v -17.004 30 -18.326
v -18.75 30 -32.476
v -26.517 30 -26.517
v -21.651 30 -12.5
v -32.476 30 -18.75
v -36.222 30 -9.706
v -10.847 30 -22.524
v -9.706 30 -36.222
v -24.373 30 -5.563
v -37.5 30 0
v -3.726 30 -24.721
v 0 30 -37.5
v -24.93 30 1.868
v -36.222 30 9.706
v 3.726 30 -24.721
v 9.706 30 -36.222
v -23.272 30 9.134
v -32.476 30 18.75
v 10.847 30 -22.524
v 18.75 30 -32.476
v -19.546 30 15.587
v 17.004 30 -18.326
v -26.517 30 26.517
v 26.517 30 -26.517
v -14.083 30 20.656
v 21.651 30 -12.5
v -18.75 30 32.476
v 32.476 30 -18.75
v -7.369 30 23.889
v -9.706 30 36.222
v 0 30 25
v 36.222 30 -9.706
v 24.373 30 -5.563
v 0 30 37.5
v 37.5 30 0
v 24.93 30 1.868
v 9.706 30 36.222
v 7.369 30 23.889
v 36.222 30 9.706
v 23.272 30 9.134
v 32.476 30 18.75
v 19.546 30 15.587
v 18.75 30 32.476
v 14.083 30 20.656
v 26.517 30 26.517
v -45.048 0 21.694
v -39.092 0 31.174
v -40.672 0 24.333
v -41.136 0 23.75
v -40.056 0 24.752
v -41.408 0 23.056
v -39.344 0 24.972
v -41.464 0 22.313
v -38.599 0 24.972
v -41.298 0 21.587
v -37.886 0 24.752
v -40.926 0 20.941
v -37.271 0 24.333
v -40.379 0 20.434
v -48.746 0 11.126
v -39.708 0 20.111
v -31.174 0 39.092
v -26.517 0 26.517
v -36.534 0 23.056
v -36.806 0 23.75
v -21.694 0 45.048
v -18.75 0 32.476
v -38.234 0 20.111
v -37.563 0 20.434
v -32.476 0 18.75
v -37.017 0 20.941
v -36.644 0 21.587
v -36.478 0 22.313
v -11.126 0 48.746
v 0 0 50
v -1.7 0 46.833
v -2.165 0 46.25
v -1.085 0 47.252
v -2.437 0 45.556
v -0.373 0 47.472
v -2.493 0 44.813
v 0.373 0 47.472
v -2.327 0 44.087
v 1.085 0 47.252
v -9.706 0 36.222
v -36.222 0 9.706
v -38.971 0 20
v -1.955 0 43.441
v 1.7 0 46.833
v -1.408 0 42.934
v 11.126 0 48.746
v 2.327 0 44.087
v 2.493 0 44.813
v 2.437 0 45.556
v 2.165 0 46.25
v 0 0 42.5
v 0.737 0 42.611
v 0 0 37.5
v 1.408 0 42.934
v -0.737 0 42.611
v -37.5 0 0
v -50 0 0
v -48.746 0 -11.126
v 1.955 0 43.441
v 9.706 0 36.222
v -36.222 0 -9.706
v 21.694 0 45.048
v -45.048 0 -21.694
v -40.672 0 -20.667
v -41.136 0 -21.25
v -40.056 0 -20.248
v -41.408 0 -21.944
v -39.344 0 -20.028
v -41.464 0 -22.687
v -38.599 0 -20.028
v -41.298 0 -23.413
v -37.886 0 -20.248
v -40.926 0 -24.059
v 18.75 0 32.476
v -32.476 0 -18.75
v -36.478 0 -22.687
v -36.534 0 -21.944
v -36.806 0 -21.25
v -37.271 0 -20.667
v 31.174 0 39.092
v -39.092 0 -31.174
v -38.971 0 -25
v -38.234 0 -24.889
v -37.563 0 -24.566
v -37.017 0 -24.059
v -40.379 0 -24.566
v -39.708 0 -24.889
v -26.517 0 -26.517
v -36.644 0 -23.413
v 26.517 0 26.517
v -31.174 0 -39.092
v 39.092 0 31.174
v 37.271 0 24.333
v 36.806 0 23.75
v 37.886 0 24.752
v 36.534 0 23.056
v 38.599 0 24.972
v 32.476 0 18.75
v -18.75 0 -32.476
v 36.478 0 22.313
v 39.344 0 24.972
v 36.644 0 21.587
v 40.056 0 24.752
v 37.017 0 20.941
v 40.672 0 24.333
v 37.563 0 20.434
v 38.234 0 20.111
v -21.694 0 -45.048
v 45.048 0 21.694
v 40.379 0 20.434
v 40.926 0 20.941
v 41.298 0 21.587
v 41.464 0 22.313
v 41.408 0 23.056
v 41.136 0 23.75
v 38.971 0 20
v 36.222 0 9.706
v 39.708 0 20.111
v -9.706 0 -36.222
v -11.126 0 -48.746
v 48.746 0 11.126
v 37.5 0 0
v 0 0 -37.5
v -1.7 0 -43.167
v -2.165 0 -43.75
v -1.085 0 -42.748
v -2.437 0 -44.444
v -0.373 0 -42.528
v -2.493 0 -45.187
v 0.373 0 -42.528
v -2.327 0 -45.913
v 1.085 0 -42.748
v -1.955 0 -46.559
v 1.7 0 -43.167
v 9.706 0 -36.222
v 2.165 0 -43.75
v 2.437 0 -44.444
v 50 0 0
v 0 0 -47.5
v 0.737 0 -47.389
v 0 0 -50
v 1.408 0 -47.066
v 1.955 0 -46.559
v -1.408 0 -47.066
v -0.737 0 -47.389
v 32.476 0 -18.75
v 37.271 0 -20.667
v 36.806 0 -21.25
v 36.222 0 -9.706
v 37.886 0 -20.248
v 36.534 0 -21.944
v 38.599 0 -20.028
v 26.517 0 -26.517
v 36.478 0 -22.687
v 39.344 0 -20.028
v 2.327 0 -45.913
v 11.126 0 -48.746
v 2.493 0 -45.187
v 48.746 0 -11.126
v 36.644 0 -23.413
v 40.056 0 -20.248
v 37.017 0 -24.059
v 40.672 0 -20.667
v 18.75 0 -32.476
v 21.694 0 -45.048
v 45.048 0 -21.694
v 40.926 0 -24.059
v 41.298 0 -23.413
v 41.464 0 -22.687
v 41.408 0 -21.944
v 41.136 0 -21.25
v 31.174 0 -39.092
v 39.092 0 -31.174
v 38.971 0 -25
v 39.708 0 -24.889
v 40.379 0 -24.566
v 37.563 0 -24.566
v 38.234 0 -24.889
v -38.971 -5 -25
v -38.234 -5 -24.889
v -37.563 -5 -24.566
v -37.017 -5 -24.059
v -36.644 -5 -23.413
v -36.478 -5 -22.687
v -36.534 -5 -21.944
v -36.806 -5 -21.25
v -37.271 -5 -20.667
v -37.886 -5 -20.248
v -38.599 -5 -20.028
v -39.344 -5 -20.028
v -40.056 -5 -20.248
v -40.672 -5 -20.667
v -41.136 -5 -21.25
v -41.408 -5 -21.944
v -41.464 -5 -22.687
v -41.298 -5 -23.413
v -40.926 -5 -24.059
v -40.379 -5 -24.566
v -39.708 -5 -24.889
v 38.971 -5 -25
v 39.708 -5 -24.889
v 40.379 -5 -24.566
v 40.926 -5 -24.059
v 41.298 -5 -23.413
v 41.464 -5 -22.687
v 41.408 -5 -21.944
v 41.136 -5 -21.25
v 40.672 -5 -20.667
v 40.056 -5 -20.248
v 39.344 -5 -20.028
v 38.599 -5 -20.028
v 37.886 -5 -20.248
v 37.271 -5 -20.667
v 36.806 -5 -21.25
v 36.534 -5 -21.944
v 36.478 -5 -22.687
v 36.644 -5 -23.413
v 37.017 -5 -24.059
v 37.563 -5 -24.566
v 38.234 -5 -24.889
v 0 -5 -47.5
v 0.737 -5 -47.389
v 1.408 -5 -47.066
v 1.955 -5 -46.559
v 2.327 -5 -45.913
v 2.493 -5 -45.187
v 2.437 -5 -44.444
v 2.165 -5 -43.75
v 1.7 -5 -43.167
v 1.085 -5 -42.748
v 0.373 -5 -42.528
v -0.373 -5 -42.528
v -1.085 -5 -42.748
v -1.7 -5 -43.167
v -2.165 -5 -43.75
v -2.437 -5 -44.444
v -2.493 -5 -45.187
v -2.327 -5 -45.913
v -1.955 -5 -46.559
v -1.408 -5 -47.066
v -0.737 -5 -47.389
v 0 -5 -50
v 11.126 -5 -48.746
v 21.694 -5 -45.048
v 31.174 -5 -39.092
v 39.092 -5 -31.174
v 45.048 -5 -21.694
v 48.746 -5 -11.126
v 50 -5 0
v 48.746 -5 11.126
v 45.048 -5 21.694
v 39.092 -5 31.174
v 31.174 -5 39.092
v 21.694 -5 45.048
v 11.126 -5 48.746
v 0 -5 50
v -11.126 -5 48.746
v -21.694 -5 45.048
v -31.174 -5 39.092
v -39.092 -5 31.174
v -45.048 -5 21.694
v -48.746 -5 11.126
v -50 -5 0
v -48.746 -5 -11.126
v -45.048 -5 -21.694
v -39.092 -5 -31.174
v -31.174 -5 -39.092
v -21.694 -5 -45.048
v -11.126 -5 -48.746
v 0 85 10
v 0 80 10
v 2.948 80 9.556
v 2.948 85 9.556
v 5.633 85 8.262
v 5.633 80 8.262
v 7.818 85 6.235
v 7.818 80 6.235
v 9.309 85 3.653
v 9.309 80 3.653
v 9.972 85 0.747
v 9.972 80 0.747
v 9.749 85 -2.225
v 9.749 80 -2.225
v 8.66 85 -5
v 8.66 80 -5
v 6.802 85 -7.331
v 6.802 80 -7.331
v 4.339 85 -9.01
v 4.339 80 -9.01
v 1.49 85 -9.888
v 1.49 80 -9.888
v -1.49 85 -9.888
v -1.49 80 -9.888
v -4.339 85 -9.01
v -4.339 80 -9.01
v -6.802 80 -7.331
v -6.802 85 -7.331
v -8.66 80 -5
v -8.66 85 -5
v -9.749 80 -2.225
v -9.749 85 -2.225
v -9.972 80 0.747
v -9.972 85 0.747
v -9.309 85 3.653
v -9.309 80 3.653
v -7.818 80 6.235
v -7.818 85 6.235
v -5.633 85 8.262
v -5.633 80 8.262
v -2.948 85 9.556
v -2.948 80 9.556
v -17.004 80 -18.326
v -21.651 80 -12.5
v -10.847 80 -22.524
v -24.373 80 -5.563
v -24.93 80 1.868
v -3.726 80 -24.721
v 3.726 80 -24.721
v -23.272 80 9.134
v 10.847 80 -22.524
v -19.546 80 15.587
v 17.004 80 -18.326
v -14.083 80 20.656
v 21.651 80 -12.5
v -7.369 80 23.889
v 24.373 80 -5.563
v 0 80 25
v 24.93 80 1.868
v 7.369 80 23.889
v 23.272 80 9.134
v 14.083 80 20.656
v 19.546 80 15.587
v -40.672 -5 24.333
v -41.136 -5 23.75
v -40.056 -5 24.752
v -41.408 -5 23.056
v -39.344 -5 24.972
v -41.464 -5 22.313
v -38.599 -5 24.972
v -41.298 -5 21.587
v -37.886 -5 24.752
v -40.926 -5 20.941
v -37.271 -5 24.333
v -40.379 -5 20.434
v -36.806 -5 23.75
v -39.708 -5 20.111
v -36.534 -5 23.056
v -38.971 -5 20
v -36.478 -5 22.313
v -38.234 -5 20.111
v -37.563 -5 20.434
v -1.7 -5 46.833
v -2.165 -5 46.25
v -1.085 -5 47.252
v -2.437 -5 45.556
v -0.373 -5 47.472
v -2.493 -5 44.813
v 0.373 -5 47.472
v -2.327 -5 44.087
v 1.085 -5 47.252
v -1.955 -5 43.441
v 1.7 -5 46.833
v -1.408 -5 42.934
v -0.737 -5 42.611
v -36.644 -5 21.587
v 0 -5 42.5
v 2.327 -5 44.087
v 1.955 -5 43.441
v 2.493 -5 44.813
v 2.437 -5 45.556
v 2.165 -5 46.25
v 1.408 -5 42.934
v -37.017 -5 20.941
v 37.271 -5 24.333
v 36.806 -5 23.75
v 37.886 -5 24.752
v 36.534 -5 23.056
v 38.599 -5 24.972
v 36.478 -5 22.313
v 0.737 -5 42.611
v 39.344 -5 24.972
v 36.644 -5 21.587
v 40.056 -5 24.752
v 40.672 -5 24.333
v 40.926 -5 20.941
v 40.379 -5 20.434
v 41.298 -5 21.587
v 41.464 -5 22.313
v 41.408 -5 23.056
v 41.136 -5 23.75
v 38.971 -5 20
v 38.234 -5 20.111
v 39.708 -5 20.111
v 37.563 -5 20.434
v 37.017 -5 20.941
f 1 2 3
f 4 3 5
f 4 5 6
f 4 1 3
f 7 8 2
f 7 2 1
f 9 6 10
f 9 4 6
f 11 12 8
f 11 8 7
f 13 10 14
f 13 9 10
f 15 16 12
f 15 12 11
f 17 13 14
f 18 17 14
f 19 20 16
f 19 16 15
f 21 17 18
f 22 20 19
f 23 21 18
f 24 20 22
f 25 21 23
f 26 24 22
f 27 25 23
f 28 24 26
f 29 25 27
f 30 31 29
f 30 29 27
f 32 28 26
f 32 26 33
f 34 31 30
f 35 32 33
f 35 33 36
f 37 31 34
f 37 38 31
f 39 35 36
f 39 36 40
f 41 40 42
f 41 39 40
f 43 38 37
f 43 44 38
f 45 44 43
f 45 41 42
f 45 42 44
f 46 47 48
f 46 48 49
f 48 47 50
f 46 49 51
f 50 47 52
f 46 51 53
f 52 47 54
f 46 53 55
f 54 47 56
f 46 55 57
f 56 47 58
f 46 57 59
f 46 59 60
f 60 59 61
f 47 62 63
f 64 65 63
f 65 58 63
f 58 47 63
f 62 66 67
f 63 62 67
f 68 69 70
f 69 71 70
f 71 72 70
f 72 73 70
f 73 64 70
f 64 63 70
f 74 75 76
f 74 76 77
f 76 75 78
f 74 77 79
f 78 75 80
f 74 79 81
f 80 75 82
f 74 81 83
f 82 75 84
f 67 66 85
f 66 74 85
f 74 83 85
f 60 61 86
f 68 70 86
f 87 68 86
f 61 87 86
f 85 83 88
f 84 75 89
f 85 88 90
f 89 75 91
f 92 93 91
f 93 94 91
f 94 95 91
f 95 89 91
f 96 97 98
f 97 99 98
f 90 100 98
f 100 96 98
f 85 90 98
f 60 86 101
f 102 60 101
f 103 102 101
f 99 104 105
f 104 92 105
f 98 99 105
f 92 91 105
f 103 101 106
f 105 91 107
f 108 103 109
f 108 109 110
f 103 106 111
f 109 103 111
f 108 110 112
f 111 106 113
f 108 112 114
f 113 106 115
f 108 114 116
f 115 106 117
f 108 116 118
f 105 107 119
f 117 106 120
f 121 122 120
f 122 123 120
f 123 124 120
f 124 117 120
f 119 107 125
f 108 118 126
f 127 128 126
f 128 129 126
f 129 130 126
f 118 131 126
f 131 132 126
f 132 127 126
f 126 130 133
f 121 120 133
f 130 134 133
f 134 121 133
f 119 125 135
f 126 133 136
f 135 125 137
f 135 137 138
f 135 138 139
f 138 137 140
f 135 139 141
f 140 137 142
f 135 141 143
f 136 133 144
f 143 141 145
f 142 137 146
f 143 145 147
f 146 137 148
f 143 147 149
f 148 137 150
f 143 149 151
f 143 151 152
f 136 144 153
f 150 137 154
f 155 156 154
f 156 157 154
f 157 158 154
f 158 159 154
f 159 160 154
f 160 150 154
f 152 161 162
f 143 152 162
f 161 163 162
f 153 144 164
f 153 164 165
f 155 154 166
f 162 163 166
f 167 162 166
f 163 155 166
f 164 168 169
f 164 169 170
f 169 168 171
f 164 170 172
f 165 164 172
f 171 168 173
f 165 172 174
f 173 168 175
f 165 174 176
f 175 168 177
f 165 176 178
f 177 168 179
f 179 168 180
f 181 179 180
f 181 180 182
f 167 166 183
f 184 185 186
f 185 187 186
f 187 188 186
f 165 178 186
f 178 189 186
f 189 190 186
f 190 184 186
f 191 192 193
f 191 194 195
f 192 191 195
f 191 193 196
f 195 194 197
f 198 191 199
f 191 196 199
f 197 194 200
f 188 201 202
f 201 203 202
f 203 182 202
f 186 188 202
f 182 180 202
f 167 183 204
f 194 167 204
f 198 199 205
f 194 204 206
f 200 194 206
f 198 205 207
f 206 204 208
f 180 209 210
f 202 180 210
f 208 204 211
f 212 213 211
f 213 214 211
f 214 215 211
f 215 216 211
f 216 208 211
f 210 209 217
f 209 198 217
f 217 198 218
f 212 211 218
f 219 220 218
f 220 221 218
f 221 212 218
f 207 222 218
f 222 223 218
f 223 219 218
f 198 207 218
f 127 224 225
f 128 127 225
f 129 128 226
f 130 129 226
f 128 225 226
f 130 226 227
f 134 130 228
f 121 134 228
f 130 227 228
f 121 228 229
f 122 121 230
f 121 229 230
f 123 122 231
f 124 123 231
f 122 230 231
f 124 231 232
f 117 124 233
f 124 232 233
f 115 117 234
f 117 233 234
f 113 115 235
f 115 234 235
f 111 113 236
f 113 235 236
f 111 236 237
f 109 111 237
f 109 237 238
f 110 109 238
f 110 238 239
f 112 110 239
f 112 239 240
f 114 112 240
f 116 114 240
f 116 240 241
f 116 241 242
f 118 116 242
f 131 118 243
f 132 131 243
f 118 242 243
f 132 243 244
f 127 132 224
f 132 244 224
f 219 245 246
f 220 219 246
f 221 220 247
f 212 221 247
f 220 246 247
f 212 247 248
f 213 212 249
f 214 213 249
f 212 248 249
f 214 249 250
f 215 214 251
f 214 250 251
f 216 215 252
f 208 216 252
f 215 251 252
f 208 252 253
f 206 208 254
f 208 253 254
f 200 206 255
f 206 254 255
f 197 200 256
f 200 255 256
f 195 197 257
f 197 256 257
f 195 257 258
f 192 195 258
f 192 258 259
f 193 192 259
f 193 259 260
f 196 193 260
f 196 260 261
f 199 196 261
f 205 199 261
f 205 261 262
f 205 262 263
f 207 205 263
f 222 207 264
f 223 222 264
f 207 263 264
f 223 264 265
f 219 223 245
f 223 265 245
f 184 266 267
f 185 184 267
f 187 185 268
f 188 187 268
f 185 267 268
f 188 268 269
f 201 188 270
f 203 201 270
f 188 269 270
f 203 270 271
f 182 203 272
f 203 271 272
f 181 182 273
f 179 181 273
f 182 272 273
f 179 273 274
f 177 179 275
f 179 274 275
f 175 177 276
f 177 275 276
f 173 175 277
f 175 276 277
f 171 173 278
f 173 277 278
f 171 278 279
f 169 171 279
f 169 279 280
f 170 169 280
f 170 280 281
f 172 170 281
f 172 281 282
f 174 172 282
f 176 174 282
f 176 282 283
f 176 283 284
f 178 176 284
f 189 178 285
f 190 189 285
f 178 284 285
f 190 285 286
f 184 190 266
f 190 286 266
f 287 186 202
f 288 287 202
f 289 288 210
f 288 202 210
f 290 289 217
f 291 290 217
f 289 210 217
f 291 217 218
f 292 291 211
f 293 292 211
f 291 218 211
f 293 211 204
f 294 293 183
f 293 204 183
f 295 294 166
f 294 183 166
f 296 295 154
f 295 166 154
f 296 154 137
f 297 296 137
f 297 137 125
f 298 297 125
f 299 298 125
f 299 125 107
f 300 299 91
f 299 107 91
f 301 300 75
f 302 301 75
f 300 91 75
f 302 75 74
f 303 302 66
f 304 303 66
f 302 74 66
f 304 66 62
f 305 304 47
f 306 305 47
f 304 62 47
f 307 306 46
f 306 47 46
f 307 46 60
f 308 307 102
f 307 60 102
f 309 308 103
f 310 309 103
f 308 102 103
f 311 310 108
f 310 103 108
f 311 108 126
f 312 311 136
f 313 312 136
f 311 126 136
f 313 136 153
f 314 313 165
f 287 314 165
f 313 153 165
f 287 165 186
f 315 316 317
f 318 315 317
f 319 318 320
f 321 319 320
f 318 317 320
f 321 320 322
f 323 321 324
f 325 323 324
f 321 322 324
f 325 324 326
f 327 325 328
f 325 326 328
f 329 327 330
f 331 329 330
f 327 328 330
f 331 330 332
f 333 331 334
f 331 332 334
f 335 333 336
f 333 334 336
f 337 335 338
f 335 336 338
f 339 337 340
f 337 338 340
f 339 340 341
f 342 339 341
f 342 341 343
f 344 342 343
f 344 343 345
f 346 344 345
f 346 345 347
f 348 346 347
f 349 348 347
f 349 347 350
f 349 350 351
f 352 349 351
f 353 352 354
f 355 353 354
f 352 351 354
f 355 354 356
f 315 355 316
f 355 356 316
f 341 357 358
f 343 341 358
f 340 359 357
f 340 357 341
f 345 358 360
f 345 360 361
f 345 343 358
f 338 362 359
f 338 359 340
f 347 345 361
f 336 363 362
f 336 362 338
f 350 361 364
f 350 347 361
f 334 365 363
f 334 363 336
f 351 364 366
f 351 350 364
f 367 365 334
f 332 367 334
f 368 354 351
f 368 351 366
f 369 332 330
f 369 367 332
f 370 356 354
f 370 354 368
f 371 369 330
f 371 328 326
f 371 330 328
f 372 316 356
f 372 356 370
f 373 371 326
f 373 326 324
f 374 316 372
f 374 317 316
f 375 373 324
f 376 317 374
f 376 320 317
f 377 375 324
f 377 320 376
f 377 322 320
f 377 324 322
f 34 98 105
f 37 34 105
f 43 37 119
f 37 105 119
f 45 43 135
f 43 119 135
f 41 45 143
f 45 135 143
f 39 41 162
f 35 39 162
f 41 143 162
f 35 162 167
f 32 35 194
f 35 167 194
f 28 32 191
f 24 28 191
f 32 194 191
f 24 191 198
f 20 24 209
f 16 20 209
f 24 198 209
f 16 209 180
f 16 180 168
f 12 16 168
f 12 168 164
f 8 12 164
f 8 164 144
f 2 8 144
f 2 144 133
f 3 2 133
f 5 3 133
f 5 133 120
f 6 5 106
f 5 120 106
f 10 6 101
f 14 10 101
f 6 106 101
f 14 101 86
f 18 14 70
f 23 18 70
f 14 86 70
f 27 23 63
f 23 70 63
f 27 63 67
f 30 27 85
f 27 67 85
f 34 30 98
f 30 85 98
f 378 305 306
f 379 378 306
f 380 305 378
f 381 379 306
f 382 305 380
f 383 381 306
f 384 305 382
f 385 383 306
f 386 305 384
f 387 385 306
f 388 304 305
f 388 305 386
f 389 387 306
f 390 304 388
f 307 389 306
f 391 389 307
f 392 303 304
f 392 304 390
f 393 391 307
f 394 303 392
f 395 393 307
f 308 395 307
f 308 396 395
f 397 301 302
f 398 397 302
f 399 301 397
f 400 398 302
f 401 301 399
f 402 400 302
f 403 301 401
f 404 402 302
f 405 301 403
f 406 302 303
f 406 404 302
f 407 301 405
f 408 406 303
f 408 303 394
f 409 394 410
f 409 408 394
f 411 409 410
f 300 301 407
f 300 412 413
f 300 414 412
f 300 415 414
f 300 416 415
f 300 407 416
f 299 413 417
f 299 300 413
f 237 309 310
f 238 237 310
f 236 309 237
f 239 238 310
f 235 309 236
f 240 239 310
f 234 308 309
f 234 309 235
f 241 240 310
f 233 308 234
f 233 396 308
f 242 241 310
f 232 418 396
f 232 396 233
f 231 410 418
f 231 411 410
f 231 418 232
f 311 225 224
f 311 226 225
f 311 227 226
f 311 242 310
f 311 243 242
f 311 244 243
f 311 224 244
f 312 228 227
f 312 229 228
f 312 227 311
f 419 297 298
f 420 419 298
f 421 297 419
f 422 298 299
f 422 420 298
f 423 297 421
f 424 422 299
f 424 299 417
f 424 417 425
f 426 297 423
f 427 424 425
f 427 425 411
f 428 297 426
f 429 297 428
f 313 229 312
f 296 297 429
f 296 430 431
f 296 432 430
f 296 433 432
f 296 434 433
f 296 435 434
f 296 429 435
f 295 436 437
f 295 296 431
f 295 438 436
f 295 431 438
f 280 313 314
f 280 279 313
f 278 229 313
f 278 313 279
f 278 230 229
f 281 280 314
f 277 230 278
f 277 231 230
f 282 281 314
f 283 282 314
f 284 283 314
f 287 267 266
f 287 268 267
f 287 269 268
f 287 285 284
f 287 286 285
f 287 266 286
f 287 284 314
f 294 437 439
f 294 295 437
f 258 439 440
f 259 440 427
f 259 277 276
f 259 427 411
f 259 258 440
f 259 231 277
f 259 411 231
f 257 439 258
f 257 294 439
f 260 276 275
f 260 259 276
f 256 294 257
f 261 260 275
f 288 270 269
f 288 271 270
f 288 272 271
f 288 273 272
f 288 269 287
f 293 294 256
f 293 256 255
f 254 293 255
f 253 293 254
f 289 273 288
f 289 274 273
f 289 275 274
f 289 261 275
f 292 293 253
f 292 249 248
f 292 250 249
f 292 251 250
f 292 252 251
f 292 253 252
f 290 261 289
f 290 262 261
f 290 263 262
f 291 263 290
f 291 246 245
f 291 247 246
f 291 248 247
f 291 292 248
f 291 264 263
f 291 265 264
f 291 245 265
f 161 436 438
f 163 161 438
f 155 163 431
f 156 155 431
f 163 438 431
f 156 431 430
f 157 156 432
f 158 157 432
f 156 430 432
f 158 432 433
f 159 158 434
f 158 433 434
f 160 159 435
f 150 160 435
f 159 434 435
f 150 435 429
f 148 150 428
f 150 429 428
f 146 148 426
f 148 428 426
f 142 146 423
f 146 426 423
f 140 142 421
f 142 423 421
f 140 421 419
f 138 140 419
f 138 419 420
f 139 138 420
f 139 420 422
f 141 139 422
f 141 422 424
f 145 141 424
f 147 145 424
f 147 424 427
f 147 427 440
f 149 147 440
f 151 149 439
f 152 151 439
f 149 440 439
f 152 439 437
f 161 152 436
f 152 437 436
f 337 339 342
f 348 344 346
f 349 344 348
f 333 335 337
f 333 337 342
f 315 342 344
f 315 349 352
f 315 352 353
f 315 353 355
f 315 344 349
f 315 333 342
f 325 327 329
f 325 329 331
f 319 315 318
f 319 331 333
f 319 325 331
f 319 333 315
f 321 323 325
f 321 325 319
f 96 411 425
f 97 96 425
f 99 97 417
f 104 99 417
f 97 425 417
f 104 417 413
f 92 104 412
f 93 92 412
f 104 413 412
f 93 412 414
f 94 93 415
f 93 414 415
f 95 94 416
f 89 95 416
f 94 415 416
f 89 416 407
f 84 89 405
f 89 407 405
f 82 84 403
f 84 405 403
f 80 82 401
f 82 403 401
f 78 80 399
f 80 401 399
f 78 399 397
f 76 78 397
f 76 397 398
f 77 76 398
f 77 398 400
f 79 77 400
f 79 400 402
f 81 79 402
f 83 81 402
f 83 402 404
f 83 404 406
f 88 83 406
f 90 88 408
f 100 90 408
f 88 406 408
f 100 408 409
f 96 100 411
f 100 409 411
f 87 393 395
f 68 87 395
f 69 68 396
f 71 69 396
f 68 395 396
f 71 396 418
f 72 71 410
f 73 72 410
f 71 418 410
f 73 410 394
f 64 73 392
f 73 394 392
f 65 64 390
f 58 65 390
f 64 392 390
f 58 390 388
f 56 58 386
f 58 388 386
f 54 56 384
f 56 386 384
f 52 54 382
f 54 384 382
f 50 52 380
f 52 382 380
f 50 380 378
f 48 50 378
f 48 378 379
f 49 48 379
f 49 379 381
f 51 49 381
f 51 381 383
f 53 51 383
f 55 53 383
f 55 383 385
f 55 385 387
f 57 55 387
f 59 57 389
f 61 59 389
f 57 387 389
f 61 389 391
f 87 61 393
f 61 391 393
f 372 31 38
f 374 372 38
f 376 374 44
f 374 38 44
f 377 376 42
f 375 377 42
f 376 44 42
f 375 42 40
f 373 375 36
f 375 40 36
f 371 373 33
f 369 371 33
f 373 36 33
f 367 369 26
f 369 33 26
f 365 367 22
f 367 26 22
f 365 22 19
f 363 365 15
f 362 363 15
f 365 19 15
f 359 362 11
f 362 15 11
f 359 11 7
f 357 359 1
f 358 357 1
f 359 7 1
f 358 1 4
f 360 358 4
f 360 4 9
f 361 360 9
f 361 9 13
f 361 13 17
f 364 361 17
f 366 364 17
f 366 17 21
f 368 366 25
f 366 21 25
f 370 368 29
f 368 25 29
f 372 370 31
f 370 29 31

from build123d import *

# Parameters (mm, degrees)
SKETCH1_R           = 37.5
BOSS_EXTRUDE1_DEPTH = 30
SKETCH2_R           = 25
BOSS_EXTRUDE2_DEPTH = 50
SKETCH3_R           = 10
BOSS_EXTRUDE3_DEPTH = 5
SKETCH4_R           = 50
BOSS_EXTRUDE4_DEPTH = 5
SKETCH5_R           = 2.5
CUT_EXTRUDE1_DEPTH  = 5


with BuildPart() as part:
    # Sketch1 → Boss-Extrude1 (new body)
    with BuildSketch(Plane(origin=(0, 0, 0), x_dir=(1, 0, 0), z_dir=(0, 1, 0))):
        with Locations(Location((0, 0, 0), (0, 0, 270))):
            Circle(SKETCH1_R)
    extrude(amount=BOSS_EXTRUDE1_DEPTH)

    # Sketch2 → Boss-Extrude2 (add)
    with BuildSketch(Plane(origin=(0, 30, 0), x_dir=(1, 0, 0), z_dir=(0, 1, 0))):
        with Locations(Location((0, 0, 0), (0, 0, 270))):
            Circle(SKETCH2_R)
    extrude(amount=BOSS_EXTRUDE2_DEPTH)

    # Sketch3 → Boss-Extrude3 (add)
    with BuildSketch(Plane(origin=(0, 80, 0), x_dir=(1, 0, 0), z_dir=(0, 1, 0))):
        with Locations(Location((0, 0, 0), (0, 0, 270))):
            Circle(SKETCH3_R)
    extrude(amount=BOSS_EXTRUDE3_DEPTH)

    # Sketch4 → Boss-Extrude4 (add)
    with BuildSketch(Plane.XZ):
        with Locations(Location((0, 0, 0), (0, 0, 270))):
            Circle(SKETCH4_R)
    extrude(amount=BOSS_EXTRUDE4_DEPTH)

    # Sketch5 → Cut-Extrude1 (cut)
    with BuildSketch(Plane.XZ.offset(5)):
        with Locations(Location((0, 45, 0), (0, 0, 270))):
            Circle(SKETCH5_R)
        with Locations(Location((38.97114317, 22.5, 0), (0, 0, 270))):
            Circle(SKETCH5_R)
        with Locations(Location((38.97114317, -22.5, 0), (0, 0, 270))):
            Circle(SKETCH5_R)
        with Locations(Location((0, -45, 0), (0, 0, 270))):
            Circle(SKETCH5_R)
        with Locations(Location((-38.97114317, -22.5, 0), (0, 0, 270))):
            Circle(SKETCH5_R)
        with Locations(Location((-38.97114317, 22.5, 0), (0, 0, 270))):
            Circle(SKETCH5_R)
    extrude(amount=-CUT_EXTRUDE1_DEPTH, mode=Mode.SUBTRACT)


solid = part.part
